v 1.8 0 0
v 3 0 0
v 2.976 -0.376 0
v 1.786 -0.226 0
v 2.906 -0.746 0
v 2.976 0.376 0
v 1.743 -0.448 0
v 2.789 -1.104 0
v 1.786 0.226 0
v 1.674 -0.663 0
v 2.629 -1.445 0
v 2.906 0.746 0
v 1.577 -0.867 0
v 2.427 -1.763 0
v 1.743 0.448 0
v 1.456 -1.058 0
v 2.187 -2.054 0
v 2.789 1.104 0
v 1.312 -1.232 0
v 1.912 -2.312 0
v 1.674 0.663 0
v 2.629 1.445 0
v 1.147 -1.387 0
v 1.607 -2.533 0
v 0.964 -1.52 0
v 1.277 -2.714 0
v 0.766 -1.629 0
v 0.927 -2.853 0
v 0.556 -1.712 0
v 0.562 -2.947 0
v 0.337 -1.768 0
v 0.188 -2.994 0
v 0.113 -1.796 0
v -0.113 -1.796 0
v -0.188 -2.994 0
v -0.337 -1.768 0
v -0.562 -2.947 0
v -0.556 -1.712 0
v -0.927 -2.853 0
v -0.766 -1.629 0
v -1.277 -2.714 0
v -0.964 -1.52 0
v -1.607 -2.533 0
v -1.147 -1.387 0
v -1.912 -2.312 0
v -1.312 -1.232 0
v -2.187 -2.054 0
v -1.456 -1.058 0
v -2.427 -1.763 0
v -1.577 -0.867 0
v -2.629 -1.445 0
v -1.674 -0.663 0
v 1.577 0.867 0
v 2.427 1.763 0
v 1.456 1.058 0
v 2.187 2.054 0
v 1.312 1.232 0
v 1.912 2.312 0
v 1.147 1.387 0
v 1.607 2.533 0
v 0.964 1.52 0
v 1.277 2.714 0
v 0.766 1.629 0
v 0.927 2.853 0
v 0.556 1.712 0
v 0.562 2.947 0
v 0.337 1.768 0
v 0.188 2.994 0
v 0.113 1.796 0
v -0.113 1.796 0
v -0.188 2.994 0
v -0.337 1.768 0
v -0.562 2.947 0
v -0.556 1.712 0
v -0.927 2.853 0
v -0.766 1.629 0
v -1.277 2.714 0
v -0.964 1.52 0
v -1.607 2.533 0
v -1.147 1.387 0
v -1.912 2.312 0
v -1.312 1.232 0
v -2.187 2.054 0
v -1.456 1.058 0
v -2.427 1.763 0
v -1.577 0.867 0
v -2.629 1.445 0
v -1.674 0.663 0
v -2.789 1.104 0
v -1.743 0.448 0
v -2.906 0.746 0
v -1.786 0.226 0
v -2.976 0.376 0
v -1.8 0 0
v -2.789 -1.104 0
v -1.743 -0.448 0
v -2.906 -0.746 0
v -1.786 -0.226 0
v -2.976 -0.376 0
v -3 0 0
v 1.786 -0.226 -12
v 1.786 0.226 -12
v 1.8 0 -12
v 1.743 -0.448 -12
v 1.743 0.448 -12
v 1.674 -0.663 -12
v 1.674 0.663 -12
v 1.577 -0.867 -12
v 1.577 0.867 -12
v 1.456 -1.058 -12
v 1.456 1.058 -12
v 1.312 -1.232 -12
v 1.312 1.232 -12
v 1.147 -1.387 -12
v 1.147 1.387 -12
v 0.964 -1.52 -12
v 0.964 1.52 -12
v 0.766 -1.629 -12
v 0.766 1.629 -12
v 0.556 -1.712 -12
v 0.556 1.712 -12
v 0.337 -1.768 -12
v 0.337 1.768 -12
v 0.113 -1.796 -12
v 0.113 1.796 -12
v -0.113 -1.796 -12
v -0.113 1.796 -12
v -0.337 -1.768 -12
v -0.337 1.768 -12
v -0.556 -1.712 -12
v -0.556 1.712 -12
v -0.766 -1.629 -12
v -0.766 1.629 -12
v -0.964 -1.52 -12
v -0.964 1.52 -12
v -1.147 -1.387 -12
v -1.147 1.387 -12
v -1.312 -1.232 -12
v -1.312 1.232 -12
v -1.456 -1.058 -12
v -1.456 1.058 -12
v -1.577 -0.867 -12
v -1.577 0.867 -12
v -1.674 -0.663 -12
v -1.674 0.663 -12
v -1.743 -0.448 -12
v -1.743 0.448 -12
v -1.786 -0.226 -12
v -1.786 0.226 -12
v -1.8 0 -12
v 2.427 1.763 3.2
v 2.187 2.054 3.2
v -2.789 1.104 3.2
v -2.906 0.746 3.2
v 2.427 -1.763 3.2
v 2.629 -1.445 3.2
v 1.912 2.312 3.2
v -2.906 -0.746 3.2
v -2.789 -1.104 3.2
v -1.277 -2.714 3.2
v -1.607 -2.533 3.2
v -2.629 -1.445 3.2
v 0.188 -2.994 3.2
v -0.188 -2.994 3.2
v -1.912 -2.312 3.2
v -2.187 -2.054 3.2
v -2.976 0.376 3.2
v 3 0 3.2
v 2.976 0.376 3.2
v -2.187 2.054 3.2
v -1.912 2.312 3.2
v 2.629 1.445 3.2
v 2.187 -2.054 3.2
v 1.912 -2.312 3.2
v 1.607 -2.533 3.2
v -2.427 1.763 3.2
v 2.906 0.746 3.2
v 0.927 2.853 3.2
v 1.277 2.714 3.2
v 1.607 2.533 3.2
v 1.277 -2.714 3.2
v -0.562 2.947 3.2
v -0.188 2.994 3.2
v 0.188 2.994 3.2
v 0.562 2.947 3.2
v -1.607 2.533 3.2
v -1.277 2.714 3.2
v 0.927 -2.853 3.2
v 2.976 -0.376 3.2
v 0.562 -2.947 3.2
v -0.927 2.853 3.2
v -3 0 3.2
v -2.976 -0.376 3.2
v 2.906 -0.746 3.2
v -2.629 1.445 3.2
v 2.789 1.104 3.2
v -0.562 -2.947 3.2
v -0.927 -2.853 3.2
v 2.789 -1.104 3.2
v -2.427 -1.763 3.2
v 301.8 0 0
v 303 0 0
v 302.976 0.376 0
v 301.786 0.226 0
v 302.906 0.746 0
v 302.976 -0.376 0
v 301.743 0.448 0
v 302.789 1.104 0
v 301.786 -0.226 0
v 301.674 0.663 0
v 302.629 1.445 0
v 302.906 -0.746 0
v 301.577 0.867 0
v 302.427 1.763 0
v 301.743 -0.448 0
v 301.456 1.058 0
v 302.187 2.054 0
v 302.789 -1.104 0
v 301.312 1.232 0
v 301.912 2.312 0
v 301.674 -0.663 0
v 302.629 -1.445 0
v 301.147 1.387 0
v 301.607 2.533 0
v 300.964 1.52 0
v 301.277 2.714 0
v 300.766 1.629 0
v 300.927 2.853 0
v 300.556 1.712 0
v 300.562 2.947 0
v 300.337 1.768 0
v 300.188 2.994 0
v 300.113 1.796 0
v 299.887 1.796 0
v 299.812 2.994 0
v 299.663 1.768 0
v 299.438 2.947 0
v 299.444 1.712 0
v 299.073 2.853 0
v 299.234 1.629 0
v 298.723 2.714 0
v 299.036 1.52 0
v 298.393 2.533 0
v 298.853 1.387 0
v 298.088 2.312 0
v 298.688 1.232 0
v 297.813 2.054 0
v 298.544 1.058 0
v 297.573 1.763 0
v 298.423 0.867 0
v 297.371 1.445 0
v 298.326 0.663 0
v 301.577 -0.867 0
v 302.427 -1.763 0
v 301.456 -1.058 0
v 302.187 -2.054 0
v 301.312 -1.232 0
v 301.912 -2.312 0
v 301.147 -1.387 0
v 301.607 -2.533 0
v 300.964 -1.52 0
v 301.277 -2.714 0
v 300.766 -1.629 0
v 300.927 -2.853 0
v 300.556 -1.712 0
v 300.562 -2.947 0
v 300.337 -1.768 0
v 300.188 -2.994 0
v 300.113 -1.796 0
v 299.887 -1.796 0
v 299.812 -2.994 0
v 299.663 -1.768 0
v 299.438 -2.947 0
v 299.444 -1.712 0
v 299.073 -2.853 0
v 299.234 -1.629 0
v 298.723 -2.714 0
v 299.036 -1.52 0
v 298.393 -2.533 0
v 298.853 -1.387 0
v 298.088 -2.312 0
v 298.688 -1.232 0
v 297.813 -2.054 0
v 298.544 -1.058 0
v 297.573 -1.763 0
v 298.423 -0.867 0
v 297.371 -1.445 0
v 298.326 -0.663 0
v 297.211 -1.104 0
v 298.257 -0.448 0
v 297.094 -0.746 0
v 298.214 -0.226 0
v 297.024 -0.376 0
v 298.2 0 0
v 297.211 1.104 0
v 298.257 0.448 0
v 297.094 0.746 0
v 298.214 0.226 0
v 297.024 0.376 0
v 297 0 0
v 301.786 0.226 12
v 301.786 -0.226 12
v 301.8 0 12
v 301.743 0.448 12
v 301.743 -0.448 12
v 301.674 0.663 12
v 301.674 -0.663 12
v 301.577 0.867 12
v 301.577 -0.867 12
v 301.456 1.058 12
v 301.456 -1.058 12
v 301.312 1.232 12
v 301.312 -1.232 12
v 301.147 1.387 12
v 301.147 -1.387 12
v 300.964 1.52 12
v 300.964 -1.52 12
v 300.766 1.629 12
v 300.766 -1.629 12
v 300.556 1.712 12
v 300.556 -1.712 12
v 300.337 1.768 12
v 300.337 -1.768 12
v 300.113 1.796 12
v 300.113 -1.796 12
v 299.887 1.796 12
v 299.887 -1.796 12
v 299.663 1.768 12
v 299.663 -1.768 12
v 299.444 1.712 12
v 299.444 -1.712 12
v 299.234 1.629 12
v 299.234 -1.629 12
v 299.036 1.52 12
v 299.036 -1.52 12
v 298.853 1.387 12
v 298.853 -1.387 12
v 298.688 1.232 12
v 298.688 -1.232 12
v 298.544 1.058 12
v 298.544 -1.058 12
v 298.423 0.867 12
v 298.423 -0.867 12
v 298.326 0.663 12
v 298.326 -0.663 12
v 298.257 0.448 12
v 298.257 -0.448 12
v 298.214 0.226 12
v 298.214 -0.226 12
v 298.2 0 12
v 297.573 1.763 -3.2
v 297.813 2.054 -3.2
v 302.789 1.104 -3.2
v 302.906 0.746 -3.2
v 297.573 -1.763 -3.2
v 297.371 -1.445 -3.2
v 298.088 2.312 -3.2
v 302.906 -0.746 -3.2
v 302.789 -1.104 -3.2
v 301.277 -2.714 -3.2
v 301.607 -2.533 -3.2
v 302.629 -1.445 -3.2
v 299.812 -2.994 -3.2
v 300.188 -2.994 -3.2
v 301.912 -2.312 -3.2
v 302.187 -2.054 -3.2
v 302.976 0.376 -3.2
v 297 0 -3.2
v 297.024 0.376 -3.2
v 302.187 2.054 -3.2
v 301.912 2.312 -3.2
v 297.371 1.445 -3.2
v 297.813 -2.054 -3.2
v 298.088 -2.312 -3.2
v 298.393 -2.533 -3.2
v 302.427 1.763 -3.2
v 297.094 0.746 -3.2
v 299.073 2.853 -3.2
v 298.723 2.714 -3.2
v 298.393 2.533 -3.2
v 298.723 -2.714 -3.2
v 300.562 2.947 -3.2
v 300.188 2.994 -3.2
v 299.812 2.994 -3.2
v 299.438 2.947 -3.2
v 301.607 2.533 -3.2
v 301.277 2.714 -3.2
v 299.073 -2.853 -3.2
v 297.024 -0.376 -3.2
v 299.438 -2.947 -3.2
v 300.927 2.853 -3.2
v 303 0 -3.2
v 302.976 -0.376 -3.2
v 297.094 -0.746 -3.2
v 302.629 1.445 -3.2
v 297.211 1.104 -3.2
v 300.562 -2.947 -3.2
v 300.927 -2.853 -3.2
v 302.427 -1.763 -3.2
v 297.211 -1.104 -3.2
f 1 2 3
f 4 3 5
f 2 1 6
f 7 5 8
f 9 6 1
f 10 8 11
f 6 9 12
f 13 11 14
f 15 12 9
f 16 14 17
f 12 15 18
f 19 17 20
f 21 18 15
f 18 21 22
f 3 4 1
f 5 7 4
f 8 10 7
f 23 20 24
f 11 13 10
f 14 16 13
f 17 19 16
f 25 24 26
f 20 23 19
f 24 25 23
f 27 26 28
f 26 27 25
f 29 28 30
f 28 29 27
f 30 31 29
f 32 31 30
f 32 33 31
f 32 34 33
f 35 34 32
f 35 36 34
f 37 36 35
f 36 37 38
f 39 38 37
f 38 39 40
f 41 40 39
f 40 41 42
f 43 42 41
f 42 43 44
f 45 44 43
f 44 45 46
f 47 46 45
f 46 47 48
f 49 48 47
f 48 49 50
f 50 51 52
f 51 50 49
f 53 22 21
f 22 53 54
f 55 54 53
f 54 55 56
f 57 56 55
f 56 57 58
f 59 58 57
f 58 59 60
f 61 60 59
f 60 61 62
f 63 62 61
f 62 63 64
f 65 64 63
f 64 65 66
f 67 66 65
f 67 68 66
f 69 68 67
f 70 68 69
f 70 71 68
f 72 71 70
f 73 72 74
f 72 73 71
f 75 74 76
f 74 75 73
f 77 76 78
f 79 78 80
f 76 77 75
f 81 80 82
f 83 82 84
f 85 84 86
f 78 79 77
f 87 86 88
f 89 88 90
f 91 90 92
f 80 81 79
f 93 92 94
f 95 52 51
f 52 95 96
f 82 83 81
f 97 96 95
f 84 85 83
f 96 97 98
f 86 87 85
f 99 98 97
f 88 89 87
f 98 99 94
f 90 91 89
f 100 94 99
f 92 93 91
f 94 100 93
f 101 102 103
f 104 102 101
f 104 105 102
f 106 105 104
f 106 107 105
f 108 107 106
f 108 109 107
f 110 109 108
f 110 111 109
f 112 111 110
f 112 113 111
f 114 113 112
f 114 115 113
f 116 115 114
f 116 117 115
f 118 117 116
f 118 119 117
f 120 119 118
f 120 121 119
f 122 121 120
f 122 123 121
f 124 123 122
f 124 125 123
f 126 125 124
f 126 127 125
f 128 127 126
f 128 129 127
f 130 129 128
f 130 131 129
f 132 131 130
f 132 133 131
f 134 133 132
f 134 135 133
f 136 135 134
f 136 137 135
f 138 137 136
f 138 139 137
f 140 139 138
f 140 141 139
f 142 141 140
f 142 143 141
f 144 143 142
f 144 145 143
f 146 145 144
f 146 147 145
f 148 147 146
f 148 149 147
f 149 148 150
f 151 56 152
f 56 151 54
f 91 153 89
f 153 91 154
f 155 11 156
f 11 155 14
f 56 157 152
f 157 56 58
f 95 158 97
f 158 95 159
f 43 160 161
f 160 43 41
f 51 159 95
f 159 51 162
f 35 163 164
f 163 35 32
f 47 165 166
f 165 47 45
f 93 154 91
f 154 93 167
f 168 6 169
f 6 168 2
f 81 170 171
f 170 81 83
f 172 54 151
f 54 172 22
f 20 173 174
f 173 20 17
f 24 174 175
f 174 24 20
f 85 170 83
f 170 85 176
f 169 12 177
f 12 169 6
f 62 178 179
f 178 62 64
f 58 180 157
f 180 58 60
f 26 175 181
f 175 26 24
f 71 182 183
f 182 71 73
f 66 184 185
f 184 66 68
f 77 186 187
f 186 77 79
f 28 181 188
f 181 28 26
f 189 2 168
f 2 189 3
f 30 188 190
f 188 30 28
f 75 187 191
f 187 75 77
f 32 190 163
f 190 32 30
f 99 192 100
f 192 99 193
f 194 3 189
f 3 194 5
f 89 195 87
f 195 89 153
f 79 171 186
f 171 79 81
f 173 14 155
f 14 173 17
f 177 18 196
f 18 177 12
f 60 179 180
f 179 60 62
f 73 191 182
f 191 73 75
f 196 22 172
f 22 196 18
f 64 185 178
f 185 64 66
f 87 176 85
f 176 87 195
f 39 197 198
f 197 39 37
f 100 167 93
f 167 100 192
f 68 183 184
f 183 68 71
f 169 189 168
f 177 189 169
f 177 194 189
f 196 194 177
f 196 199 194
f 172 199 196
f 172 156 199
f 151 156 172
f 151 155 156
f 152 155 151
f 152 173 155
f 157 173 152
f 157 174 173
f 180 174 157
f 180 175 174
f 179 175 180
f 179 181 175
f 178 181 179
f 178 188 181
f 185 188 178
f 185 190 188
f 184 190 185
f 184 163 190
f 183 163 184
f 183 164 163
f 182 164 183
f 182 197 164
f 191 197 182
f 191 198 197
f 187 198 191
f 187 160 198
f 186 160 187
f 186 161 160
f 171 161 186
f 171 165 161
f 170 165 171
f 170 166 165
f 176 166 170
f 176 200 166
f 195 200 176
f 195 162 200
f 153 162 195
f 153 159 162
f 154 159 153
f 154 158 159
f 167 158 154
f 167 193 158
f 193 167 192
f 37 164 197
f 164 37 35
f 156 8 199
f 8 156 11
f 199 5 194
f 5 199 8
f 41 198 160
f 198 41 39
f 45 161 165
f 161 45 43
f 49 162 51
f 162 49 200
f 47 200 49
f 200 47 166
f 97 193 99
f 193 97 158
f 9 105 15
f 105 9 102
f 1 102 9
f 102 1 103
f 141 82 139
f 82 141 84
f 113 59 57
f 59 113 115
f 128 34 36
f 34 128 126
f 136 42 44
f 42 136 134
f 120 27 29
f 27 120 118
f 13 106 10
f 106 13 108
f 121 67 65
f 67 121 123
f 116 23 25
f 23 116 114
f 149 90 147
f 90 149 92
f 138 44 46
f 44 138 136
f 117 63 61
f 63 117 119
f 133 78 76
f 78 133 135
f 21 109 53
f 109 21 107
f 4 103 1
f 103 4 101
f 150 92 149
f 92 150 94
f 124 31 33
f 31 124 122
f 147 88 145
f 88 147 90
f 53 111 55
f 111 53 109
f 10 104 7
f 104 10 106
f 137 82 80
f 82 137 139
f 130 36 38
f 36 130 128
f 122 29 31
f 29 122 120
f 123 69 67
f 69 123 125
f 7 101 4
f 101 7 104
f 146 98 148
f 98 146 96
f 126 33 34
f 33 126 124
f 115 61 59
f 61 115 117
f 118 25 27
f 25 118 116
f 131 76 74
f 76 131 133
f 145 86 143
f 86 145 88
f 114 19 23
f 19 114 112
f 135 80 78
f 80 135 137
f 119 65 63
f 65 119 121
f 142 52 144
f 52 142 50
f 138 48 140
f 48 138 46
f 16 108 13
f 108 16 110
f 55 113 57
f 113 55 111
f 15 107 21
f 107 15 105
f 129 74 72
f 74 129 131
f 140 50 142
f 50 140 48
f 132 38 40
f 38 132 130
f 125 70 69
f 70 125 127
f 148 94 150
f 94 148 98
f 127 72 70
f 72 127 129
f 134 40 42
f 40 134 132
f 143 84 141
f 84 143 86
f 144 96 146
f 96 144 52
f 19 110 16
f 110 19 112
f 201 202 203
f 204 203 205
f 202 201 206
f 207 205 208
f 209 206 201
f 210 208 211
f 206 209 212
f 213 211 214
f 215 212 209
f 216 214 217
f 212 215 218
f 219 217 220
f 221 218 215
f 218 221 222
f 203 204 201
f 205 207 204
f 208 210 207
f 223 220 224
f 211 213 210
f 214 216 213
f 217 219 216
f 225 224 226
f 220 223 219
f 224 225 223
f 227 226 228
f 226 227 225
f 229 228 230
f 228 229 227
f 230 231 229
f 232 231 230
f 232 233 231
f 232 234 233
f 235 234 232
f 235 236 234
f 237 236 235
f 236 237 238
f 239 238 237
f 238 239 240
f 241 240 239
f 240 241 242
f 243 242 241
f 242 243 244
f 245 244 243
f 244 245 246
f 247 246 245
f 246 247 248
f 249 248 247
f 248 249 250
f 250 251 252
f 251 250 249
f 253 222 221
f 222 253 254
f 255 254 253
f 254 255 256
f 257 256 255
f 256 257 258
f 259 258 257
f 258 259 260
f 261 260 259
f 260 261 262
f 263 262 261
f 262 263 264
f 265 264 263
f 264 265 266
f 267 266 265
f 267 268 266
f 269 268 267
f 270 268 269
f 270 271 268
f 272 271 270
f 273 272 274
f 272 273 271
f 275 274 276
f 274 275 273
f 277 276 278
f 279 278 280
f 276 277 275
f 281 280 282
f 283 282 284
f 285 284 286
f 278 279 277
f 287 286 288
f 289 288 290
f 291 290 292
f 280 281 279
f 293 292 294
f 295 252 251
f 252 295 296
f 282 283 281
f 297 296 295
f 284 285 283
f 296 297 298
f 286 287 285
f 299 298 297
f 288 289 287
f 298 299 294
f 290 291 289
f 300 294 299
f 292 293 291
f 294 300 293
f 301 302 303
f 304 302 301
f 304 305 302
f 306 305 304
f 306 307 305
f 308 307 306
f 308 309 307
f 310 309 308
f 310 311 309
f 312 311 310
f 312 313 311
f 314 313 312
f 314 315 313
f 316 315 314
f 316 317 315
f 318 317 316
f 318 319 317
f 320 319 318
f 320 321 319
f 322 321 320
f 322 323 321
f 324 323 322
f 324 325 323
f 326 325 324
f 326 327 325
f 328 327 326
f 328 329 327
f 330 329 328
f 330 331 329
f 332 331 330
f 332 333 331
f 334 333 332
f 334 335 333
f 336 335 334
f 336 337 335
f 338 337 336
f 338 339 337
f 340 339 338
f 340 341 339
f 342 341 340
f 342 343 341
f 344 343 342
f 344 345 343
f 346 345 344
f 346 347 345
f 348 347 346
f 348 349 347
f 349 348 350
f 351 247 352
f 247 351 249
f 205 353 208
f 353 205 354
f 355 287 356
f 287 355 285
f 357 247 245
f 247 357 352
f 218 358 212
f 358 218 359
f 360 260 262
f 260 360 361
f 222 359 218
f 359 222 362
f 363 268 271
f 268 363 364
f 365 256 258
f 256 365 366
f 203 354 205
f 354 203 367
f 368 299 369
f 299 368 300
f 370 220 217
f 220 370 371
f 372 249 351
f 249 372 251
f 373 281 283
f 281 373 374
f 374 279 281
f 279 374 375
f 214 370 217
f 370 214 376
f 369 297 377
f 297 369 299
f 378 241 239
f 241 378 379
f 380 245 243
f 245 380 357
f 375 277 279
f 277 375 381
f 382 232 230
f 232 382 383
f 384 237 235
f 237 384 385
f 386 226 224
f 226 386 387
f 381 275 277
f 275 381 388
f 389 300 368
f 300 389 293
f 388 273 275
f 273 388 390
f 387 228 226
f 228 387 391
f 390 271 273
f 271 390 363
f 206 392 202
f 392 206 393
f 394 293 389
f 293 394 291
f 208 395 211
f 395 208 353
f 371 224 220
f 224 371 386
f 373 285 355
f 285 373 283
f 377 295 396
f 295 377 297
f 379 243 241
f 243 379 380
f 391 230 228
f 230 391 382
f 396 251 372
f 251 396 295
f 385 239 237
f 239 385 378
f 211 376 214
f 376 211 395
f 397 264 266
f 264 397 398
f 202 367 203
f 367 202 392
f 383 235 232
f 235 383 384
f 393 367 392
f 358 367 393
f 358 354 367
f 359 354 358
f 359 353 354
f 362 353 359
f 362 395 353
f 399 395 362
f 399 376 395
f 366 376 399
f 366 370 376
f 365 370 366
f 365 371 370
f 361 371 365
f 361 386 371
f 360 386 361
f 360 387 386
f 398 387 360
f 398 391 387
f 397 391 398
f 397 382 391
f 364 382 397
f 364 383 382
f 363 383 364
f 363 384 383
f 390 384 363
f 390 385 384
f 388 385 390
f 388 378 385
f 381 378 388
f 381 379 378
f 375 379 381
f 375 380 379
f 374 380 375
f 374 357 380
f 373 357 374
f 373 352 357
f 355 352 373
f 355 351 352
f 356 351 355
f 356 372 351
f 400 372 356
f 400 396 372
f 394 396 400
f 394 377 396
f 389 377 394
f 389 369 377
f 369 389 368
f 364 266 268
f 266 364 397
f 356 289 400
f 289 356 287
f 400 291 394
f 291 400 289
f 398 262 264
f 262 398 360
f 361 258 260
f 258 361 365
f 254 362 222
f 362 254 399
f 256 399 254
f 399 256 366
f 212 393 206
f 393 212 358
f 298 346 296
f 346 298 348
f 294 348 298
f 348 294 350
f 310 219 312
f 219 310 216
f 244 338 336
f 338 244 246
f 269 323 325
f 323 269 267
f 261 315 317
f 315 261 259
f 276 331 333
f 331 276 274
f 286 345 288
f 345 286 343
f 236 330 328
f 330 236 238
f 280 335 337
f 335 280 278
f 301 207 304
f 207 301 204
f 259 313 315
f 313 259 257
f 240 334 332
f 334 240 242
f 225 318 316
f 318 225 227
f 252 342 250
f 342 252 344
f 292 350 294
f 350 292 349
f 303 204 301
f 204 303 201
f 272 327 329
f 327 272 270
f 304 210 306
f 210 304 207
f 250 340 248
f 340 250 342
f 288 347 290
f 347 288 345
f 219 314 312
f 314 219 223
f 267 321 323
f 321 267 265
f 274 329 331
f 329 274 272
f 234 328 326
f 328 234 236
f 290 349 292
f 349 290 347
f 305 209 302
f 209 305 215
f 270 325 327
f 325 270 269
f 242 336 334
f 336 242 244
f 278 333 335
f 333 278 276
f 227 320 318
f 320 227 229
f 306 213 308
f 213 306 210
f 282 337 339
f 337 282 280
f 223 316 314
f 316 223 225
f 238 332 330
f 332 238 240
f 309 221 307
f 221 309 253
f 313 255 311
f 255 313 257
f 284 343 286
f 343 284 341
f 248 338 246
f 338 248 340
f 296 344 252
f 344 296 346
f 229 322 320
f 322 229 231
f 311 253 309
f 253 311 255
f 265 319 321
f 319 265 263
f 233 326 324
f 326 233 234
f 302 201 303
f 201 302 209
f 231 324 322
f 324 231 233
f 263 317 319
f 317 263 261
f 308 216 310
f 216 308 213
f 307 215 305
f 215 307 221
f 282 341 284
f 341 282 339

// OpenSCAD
$fn = 50;


difference() {
	union() {
		translate(v = [0, 0, 0]) {
			rotate(a = [0, 0, 0]) {
				difference() {
					union() {
						translate(v = [0, 0, -12.0000000000]) {
							cylinder(h = 12.0000000000, r = 1.5000000000);
						}
						cylinder(h = 3.2000000000, r = 3.0000000000);
						translate(v = [0, 0, -12.0000000000]) {
							cylinder(h = 12.0000000000, r = 1.8000000000);
						}
						translate(v = [0, 0, -12.0000000000]) {
							cylinder(h = 12.0000000000, r = 1.5000000000);
						}
					}
					union();
				}
			}
		}
		translate(v = [300, 0, 0]) {
			rotate(a = [0, 180, 0]) {
				difference() {
					union() {
						translate(v = [0, 0, -12.0000000000]) {
							cylinder(h = 12.0000000000, r = 1.5000000000);
						}
						cylinder(h = 3.2000000000, r = 3.0000000000);
						translate(v = [0, 0, -12.0000000000]) {
							cylinder(h = 12.0000000000, r = 1.8000000000);
						}
						translate(v = [0, 0, -12.0000000000]) {
							cylinder(h = 12.0000000000, r = 1.5000000000);
						}
					}
					union();
				}
			}
		}
		*color(alpha = 1.0000000000, c = "gray") {
			translate(v = [0, 14, 0]) {
				linear_extrude(height = 1) {
					text(font = "Arial:style=Bold", halign = "center", size = 4.5000000000, text = "COMMENT oobb_screw_socket_cap_shape_m3_radius_name_12_mm_depth", valign = "center");
				}
			}
		}
		*color(alpha = 1.0000000000, c = "gray") {
			translate(v = [0, 14, 0]) {
				linear_extrude(height = 1) {
					text(font = "Arial:style=Bold", halign = "center", size = 4.5000000000, text = "COMMENT description oobb_screw_socket_cap_shape_p_type_m3_radius_name_12.0_depth", valign = "center");
				}
			}
		}
		*color(alpha = 1.0000000000, c = "gray") {
			translate(v = [300, 14, 0]) {
				linear_extrude(height = 1) {
					text(font = "Arial:style=Bold", halign = "center", size = 4.5000000000, text = "COMMENT oobb_screw_socket_cap_shape_m3_radius_name_12_mm_depth rot_y : 180", valign = "center");
				}
			}
		}
		*color(alpha = 1.0000000000, c = "gray") {
			translate(v = [300, 14, 0]) {
				linear_extrude(height = 1) {
					text(font = "Arial:style=Bold", halign = "center", size = 4.5000000000, text = "COMMENT description oobb_screw_socket_cap_shape_p_type_m3_radius_name_12.0_depth_300_0_0_pos_180_rot_y", valign = "center");
				}
			}
		}
	}
	union();
}
